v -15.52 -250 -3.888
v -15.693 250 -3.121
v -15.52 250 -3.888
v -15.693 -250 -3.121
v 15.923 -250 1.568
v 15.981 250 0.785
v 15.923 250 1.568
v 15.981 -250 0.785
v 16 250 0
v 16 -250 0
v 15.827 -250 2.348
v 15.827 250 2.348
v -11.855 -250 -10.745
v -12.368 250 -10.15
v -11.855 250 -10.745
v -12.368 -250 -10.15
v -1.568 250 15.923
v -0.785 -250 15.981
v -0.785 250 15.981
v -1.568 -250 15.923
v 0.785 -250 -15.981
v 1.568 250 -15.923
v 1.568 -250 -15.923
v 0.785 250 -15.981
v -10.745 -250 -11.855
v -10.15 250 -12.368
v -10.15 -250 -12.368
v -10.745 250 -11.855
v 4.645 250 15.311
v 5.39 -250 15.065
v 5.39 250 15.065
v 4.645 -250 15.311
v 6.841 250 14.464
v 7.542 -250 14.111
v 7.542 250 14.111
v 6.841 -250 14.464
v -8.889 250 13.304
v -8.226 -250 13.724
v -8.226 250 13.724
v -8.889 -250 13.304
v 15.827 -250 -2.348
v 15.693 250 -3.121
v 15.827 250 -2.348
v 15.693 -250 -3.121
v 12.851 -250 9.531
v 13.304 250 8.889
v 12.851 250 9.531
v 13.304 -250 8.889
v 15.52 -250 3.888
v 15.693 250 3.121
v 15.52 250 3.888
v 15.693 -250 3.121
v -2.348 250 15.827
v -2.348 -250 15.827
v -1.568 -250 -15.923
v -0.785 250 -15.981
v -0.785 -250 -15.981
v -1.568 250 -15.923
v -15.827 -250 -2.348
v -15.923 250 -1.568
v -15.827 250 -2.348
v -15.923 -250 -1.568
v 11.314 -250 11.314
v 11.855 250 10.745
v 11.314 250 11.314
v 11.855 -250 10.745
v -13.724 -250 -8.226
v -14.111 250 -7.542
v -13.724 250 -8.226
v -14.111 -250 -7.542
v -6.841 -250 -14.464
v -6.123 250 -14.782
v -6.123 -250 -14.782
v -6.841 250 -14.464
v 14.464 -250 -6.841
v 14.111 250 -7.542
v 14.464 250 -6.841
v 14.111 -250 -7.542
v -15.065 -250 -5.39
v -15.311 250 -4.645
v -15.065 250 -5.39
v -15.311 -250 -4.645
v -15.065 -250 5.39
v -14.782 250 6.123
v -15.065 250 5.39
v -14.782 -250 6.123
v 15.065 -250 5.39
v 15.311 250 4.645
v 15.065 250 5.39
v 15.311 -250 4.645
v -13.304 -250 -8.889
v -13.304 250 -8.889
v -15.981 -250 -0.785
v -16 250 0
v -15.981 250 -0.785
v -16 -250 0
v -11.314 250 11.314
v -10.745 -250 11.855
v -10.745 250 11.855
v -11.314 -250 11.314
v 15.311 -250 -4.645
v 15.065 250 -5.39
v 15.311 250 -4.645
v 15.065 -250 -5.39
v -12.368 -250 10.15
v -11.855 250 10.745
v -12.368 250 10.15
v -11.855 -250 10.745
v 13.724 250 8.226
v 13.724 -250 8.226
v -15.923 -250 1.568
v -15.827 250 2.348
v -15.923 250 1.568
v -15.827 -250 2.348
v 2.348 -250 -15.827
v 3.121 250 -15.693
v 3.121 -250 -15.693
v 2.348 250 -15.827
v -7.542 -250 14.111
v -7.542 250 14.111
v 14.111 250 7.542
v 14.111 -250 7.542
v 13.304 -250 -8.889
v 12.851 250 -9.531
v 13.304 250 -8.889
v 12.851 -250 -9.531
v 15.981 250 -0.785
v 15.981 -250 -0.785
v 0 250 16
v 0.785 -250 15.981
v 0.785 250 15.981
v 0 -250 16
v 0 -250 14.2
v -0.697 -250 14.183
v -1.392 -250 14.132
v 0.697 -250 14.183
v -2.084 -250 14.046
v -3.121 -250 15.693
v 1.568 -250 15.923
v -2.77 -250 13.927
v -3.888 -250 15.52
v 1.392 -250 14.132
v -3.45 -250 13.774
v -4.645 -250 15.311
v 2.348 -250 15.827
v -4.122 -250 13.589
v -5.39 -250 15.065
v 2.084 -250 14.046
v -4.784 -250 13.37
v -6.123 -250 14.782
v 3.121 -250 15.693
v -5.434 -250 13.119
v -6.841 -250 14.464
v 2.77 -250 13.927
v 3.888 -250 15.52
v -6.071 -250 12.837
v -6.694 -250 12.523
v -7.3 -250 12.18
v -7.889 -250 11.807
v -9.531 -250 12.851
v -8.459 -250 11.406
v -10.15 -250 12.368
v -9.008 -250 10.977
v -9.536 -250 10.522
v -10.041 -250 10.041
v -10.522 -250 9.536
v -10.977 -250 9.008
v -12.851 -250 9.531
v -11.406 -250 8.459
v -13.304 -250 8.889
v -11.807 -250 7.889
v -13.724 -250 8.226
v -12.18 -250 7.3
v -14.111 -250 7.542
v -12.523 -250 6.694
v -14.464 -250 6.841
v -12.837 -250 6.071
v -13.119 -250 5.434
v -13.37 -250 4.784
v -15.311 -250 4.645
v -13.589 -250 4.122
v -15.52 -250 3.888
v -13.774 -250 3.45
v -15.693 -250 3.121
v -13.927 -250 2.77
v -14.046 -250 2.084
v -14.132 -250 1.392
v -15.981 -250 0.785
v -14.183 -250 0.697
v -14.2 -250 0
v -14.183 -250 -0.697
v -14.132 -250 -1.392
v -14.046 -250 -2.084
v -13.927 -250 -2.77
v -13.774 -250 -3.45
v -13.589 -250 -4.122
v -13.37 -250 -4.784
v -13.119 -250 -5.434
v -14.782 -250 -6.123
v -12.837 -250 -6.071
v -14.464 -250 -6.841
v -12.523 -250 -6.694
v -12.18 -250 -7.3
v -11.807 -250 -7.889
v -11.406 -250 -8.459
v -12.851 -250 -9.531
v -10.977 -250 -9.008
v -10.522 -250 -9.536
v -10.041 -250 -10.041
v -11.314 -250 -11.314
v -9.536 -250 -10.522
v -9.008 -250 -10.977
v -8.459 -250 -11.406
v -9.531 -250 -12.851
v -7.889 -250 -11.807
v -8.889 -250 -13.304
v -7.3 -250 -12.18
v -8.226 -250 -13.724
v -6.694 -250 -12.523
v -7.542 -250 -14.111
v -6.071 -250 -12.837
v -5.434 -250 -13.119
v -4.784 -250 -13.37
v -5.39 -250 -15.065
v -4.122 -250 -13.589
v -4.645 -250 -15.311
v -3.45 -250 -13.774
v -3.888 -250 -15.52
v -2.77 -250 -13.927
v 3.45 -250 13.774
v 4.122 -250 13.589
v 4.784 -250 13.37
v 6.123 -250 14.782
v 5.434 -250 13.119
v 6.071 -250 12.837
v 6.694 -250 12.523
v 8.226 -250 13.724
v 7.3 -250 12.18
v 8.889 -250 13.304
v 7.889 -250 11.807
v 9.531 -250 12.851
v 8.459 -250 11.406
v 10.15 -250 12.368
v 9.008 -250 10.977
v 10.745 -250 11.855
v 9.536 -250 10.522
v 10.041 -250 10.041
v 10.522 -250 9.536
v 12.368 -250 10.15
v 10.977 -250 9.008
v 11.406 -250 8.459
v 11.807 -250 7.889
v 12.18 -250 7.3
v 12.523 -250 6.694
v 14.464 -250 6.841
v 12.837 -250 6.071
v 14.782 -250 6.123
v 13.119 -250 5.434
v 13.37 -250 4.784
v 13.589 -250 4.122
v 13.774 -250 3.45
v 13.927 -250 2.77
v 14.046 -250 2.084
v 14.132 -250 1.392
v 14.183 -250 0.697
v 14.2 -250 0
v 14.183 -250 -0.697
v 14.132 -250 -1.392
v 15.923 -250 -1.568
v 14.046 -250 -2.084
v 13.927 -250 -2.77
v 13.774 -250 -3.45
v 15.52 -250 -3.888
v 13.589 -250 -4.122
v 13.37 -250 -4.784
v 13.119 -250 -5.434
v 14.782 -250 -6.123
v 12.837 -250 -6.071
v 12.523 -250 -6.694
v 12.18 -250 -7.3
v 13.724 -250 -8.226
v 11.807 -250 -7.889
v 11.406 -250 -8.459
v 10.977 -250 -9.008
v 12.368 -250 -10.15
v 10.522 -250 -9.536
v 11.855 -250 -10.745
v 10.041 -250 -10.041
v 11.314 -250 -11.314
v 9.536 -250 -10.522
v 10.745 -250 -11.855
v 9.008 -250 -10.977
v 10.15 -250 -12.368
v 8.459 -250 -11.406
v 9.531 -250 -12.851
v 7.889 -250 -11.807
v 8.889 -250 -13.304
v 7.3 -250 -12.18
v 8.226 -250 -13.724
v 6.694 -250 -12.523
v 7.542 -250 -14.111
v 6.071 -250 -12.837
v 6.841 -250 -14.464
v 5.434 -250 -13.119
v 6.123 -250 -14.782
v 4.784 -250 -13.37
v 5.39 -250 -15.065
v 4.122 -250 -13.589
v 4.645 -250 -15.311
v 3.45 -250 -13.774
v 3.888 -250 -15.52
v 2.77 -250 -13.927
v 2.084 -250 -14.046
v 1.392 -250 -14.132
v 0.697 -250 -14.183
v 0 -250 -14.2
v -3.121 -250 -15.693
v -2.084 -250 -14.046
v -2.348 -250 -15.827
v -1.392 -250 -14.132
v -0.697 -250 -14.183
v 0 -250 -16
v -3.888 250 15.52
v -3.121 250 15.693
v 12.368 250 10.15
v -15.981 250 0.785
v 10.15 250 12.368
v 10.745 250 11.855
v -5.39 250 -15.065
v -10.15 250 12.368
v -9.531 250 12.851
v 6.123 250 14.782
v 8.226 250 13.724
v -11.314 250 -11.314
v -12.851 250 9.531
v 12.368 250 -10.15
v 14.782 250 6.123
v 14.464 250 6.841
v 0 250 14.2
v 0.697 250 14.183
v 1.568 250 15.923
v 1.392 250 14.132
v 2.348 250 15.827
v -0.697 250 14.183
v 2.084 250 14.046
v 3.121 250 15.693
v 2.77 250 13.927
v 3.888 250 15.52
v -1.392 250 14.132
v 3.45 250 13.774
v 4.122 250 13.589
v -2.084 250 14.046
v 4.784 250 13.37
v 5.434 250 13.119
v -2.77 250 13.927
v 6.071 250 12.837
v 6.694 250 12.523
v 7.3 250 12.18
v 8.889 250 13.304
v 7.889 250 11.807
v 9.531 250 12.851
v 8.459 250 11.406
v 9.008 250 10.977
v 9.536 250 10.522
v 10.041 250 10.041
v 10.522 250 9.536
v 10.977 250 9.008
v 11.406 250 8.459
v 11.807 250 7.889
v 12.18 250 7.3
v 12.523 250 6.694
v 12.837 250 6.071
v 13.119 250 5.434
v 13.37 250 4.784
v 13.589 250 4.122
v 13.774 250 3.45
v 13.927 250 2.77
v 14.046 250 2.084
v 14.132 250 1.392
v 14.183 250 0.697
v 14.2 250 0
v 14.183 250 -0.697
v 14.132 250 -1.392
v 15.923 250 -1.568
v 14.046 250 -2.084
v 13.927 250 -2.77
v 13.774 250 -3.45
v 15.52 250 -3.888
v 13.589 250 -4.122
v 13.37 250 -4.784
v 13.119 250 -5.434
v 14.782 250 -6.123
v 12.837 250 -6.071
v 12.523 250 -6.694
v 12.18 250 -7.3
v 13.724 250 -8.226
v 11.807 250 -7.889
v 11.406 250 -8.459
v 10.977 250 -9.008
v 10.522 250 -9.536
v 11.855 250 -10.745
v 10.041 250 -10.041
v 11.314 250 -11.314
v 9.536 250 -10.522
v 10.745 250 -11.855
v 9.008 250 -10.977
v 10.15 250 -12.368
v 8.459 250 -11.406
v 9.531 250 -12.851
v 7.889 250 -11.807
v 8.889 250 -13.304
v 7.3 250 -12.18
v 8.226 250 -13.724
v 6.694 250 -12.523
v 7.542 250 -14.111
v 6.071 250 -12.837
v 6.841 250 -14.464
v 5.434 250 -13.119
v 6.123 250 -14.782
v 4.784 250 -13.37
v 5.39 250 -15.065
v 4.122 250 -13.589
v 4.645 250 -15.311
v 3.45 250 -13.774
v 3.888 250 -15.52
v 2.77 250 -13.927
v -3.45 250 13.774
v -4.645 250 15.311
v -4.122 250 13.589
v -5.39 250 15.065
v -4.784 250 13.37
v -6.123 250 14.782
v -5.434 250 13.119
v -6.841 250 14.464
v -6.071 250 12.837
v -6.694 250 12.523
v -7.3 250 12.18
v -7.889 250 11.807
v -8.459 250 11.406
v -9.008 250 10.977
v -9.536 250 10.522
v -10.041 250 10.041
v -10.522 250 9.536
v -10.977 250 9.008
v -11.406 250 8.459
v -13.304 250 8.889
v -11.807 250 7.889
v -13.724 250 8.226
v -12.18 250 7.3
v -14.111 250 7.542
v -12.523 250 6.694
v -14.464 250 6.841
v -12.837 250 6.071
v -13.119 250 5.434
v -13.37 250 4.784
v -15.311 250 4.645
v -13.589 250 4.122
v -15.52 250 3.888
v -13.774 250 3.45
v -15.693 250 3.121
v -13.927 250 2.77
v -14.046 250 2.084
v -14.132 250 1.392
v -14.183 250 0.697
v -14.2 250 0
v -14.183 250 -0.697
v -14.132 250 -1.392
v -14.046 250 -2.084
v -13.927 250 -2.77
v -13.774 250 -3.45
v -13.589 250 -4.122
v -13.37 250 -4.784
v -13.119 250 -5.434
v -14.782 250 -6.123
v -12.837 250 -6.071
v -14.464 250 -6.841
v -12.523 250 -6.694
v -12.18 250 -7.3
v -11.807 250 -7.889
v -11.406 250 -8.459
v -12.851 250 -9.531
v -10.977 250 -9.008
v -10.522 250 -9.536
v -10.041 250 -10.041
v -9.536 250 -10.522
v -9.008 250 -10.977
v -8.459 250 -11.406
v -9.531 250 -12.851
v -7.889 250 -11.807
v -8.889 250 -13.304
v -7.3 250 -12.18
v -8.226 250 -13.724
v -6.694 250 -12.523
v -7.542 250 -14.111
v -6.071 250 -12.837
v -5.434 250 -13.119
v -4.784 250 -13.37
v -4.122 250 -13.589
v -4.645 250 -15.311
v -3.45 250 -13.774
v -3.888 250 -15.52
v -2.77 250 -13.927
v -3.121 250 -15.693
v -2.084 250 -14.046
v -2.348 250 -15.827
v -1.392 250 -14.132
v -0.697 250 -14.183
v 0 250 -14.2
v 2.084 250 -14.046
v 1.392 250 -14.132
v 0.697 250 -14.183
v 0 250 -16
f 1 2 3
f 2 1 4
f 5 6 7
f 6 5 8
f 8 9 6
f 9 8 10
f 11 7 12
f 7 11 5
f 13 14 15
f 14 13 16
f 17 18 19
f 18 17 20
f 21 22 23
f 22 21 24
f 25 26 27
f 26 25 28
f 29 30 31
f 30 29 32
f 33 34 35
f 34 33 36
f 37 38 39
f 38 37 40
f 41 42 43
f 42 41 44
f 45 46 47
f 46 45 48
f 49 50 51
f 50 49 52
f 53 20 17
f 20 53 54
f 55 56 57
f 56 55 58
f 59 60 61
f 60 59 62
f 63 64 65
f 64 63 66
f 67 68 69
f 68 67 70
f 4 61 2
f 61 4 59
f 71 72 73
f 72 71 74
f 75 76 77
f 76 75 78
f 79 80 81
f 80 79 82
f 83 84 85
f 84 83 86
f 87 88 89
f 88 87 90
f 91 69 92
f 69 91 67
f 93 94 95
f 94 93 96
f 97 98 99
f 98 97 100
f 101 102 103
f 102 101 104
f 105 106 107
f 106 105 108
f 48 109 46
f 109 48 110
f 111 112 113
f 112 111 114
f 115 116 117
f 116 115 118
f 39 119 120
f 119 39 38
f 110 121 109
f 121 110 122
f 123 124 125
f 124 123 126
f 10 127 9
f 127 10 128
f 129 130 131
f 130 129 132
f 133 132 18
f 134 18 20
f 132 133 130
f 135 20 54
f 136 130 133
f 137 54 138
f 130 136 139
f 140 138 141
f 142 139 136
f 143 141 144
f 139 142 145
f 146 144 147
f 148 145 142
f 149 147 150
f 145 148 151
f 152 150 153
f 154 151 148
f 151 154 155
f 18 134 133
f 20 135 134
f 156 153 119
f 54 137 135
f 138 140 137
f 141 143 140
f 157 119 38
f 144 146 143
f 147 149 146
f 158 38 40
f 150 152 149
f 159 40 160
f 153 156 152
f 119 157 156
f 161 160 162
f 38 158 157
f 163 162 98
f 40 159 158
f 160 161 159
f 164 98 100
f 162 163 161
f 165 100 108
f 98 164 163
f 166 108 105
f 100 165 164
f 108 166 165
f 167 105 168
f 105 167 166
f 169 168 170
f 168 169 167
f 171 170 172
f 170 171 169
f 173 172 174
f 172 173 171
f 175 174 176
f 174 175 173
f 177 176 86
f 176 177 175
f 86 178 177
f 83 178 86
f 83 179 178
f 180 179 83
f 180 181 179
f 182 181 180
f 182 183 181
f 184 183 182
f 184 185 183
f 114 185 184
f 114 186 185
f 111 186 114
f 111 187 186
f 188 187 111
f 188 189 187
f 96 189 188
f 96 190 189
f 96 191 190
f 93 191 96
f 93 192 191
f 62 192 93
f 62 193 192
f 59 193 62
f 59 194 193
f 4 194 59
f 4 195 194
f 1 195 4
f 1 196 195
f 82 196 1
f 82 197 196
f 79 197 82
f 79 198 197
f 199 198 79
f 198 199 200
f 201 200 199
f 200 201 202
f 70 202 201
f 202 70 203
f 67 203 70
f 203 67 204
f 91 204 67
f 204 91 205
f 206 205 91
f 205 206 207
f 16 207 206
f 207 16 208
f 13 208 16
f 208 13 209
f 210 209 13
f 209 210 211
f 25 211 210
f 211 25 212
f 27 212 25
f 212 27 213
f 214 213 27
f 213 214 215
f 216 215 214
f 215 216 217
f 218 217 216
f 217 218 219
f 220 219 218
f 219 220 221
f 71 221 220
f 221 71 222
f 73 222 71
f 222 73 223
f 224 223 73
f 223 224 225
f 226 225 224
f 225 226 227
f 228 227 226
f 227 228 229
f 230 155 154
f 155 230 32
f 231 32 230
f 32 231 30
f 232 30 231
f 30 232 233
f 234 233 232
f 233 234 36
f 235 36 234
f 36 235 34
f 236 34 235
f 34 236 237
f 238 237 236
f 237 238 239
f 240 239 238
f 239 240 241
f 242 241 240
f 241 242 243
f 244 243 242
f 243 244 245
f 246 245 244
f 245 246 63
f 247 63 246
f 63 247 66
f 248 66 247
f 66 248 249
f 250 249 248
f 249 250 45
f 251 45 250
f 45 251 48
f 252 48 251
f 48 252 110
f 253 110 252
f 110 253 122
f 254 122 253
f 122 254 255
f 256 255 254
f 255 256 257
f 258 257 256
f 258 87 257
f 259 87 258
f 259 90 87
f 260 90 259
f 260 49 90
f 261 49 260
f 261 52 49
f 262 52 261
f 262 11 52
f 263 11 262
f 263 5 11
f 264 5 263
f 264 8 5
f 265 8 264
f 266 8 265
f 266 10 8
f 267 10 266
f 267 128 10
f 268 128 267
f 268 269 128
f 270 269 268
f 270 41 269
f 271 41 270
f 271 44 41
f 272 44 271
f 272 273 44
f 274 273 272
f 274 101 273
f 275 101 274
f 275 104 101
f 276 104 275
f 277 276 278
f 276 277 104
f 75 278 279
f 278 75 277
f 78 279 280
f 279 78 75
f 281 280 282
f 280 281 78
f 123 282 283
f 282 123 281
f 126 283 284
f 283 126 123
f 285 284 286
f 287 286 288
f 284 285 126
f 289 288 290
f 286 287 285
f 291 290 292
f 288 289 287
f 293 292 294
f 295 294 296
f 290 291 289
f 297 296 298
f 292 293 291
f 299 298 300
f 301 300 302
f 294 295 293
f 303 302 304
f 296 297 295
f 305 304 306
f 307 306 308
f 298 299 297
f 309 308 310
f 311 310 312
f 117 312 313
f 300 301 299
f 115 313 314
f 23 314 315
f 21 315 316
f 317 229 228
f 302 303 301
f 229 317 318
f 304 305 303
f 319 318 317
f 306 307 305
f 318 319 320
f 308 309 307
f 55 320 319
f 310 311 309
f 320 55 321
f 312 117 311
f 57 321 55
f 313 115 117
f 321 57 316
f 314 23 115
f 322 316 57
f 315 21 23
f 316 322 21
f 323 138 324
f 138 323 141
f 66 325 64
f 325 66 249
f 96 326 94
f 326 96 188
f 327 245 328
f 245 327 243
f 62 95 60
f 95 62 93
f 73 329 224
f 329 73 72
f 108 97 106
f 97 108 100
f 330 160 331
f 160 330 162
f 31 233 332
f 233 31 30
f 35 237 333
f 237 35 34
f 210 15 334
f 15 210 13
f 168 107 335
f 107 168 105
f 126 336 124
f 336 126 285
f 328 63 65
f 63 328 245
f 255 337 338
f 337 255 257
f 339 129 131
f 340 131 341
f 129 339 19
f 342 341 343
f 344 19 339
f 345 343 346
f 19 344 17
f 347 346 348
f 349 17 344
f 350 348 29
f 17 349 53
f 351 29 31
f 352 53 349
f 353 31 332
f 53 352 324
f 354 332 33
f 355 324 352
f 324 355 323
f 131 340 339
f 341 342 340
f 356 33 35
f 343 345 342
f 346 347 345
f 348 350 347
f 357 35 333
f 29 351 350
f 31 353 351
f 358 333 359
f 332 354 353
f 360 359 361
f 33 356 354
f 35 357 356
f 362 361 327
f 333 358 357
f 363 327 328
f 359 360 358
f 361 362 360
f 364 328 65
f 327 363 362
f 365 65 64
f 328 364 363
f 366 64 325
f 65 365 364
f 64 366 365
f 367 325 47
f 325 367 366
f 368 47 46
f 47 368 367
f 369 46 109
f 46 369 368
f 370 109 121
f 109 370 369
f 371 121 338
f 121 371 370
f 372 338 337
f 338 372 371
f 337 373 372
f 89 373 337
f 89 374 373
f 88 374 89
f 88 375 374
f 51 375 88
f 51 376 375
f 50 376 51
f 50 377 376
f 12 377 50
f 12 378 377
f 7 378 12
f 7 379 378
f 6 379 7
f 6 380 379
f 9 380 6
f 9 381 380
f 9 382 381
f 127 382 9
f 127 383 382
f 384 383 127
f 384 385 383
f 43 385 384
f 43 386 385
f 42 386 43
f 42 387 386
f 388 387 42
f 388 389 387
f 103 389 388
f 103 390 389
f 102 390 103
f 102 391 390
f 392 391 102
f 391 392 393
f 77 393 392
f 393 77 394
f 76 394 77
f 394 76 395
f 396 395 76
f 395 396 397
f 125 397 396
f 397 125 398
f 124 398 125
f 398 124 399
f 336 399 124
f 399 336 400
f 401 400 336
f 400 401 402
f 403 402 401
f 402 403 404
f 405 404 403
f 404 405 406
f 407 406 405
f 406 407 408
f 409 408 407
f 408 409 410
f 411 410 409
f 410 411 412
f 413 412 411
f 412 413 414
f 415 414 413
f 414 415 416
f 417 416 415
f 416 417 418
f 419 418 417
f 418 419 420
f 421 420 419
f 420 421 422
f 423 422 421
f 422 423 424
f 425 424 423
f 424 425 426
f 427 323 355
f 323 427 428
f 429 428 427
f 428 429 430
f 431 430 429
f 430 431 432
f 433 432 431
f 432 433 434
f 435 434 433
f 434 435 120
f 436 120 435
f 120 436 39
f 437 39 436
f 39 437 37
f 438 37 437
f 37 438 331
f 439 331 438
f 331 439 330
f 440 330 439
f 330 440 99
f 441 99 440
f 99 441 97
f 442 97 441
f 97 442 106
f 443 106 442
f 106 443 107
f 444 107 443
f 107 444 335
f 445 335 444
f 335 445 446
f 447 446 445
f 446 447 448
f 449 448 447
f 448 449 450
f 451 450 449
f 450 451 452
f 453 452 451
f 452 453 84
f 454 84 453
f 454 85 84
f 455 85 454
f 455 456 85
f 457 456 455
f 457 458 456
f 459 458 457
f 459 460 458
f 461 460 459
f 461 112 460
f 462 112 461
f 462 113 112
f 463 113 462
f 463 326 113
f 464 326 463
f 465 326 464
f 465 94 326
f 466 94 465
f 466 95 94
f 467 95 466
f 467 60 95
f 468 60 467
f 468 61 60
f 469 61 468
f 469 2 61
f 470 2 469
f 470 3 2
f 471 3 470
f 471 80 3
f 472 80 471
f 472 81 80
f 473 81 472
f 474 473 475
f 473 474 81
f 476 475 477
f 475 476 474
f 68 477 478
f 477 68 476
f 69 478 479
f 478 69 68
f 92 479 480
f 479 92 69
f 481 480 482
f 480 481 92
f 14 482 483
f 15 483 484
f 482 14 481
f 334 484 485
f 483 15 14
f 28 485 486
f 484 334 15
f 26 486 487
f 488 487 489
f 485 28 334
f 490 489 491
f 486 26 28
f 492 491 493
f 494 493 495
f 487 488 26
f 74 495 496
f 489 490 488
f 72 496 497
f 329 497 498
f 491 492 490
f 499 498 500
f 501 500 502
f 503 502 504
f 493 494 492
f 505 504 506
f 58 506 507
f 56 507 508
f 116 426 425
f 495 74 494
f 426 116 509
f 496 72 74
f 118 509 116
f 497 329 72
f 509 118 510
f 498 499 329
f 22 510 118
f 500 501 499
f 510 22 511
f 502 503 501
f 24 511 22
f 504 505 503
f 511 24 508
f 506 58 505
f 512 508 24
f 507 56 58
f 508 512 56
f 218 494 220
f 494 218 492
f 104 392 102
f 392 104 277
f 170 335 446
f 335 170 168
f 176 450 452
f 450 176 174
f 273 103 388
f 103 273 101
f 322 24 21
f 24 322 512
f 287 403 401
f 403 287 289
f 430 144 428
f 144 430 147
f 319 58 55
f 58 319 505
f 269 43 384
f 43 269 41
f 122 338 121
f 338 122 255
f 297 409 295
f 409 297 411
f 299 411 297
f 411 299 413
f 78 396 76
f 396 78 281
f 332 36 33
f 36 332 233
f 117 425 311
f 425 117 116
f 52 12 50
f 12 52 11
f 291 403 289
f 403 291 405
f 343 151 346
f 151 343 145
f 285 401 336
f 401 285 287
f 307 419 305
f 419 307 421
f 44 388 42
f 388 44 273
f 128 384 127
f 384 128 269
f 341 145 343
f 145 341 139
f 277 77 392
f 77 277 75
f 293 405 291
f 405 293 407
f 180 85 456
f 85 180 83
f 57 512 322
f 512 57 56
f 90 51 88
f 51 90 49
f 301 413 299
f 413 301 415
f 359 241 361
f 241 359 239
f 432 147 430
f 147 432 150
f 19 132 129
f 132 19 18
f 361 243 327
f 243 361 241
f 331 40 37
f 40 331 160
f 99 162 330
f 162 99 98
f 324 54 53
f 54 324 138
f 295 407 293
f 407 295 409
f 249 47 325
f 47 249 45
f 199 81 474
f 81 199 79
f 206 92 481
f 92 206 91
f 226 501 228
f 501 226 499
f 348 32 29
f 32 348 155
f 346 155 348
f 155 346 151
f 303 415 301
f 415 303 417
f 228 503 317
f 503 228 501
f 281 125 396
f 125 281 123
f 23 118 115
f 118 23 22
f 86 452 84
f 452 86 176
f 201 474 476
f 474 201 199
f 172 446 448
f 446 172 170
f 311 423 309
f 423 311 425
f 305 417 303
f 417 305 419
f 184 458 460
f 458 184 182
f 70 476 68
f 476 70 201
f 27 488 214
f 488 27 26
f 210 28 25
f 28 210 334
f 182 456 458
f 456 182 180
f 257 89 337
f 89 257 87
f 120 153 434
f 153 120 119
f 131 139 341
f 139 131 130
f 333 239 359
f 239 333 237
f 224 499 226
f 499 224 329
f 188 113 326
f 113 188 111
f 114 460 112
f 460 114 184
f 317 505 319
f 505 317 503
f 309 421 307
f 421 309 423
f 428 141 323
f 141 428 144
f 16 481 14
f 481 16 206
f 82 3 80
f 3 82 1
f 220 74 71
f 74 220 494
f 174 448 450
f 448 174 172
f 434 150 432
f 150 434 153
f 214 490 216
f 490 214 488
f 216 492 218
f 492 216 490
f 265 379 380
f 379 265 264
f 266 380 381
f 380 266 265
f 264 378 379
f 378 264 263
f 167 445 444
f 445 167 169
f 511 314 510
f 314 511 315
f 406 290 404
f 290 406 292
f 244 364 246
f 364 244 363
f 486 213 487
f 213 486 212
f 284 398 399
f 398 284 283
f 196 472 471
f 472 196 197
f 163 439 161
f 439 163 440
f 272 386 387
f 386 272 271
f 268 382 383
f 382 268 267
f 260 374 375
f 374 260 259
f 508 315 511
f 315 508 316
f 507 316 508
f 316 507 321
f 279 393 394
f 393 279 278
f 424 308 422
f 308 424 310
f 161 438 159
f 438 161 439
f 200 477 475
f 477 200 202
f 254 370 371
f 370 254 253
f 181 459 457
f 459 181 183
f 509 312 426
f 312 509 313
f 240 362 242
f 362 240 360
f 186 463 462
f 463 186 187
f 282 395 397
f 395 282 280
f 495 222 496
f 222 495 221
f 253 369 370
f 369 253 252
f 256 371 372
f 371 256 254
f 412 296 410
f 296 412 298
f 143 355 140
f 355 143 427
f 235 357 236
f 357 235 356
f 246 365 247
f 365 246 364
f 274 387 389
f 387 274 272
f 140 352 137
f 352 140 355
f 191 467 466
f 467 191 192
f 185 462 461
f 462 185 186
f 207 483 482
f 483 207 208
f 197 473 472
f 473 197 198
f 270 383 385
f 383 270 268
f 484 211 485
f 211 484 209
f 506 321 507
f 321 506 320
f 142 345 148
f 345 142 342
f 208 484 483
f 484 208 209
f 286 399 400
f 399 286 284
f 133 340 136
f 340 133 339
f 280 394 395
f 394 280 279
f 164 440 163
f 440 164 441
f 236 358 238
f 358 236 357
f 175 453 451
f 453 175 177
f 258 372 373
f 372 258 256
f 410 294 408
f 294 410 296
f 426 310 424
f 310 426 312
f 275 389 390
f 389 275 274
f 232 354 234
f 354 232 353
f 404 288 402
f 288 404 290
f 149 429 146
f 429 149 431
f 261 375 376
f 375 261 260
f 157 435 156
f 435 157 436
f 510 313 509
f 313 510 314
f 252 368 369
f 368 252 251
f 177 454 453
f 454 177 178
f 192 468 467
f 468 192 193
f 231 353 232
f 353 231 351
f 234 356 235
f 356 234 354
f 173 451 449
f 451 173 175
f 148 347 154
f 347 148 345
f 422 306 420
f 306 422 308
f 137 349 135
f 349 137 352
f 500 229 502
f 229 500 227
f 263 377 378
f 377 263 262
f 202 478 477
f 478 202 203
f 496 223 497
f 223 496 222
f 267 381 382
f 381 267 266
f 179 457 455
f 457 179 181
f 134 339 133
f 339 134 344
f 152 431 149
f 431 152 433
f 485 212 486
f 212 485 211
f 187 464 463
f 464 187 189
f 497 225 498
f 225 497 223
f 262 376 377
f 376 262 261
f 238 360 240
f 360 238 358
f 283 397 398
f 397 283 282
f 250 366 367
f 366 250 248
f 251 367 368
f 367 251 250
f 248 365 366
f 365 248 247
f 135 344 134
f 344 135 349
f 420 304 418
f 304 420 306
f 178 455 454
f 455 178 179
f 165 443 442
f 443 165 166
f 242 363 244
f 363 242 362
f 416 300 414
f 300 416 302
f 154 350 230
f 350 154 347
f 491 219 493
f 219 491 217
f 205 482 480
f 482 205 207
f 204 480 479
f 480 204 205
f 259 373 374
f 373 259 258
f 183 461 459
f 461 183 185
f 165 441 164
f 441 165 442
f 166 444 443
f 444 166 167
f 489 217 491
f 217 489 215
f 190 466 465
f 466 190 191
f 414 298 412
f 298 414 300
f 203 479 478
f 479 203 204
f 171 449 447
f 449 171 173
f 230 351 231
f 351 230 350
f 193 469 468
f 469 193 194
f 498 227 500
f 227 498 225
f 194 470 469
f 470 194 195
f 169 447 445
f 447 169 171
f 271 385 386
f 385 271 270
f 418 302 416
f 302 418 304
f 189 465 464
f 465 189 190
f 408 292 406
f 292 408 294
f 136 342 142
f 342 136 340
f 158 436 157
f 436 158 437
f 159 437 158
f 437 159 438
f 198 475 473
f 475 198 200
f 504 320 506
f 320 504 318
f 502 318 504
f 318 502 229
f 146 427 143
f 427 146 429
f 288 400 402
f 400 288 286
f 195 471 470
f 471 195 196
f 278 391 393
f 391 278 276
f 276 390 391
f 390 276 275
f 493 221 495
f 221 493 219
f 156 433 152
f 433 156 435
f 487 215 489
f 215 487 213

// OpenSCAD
$fn = 128;

// HT 32 pipe: OD 32 mm, wall 1.8 mm, length 500 mm
od   = 32;
wall = 1.8;
id   = od - 2*wall;
len  = 500;

eps = 0.2;

rotate([90, 0, 0])  // align pipe axis with Y so orthographic views are consistent
difference() {
    cylinder(h = len, d = od, center = true);
    cylinder(h = len + eps, d = id, center = true);
}
